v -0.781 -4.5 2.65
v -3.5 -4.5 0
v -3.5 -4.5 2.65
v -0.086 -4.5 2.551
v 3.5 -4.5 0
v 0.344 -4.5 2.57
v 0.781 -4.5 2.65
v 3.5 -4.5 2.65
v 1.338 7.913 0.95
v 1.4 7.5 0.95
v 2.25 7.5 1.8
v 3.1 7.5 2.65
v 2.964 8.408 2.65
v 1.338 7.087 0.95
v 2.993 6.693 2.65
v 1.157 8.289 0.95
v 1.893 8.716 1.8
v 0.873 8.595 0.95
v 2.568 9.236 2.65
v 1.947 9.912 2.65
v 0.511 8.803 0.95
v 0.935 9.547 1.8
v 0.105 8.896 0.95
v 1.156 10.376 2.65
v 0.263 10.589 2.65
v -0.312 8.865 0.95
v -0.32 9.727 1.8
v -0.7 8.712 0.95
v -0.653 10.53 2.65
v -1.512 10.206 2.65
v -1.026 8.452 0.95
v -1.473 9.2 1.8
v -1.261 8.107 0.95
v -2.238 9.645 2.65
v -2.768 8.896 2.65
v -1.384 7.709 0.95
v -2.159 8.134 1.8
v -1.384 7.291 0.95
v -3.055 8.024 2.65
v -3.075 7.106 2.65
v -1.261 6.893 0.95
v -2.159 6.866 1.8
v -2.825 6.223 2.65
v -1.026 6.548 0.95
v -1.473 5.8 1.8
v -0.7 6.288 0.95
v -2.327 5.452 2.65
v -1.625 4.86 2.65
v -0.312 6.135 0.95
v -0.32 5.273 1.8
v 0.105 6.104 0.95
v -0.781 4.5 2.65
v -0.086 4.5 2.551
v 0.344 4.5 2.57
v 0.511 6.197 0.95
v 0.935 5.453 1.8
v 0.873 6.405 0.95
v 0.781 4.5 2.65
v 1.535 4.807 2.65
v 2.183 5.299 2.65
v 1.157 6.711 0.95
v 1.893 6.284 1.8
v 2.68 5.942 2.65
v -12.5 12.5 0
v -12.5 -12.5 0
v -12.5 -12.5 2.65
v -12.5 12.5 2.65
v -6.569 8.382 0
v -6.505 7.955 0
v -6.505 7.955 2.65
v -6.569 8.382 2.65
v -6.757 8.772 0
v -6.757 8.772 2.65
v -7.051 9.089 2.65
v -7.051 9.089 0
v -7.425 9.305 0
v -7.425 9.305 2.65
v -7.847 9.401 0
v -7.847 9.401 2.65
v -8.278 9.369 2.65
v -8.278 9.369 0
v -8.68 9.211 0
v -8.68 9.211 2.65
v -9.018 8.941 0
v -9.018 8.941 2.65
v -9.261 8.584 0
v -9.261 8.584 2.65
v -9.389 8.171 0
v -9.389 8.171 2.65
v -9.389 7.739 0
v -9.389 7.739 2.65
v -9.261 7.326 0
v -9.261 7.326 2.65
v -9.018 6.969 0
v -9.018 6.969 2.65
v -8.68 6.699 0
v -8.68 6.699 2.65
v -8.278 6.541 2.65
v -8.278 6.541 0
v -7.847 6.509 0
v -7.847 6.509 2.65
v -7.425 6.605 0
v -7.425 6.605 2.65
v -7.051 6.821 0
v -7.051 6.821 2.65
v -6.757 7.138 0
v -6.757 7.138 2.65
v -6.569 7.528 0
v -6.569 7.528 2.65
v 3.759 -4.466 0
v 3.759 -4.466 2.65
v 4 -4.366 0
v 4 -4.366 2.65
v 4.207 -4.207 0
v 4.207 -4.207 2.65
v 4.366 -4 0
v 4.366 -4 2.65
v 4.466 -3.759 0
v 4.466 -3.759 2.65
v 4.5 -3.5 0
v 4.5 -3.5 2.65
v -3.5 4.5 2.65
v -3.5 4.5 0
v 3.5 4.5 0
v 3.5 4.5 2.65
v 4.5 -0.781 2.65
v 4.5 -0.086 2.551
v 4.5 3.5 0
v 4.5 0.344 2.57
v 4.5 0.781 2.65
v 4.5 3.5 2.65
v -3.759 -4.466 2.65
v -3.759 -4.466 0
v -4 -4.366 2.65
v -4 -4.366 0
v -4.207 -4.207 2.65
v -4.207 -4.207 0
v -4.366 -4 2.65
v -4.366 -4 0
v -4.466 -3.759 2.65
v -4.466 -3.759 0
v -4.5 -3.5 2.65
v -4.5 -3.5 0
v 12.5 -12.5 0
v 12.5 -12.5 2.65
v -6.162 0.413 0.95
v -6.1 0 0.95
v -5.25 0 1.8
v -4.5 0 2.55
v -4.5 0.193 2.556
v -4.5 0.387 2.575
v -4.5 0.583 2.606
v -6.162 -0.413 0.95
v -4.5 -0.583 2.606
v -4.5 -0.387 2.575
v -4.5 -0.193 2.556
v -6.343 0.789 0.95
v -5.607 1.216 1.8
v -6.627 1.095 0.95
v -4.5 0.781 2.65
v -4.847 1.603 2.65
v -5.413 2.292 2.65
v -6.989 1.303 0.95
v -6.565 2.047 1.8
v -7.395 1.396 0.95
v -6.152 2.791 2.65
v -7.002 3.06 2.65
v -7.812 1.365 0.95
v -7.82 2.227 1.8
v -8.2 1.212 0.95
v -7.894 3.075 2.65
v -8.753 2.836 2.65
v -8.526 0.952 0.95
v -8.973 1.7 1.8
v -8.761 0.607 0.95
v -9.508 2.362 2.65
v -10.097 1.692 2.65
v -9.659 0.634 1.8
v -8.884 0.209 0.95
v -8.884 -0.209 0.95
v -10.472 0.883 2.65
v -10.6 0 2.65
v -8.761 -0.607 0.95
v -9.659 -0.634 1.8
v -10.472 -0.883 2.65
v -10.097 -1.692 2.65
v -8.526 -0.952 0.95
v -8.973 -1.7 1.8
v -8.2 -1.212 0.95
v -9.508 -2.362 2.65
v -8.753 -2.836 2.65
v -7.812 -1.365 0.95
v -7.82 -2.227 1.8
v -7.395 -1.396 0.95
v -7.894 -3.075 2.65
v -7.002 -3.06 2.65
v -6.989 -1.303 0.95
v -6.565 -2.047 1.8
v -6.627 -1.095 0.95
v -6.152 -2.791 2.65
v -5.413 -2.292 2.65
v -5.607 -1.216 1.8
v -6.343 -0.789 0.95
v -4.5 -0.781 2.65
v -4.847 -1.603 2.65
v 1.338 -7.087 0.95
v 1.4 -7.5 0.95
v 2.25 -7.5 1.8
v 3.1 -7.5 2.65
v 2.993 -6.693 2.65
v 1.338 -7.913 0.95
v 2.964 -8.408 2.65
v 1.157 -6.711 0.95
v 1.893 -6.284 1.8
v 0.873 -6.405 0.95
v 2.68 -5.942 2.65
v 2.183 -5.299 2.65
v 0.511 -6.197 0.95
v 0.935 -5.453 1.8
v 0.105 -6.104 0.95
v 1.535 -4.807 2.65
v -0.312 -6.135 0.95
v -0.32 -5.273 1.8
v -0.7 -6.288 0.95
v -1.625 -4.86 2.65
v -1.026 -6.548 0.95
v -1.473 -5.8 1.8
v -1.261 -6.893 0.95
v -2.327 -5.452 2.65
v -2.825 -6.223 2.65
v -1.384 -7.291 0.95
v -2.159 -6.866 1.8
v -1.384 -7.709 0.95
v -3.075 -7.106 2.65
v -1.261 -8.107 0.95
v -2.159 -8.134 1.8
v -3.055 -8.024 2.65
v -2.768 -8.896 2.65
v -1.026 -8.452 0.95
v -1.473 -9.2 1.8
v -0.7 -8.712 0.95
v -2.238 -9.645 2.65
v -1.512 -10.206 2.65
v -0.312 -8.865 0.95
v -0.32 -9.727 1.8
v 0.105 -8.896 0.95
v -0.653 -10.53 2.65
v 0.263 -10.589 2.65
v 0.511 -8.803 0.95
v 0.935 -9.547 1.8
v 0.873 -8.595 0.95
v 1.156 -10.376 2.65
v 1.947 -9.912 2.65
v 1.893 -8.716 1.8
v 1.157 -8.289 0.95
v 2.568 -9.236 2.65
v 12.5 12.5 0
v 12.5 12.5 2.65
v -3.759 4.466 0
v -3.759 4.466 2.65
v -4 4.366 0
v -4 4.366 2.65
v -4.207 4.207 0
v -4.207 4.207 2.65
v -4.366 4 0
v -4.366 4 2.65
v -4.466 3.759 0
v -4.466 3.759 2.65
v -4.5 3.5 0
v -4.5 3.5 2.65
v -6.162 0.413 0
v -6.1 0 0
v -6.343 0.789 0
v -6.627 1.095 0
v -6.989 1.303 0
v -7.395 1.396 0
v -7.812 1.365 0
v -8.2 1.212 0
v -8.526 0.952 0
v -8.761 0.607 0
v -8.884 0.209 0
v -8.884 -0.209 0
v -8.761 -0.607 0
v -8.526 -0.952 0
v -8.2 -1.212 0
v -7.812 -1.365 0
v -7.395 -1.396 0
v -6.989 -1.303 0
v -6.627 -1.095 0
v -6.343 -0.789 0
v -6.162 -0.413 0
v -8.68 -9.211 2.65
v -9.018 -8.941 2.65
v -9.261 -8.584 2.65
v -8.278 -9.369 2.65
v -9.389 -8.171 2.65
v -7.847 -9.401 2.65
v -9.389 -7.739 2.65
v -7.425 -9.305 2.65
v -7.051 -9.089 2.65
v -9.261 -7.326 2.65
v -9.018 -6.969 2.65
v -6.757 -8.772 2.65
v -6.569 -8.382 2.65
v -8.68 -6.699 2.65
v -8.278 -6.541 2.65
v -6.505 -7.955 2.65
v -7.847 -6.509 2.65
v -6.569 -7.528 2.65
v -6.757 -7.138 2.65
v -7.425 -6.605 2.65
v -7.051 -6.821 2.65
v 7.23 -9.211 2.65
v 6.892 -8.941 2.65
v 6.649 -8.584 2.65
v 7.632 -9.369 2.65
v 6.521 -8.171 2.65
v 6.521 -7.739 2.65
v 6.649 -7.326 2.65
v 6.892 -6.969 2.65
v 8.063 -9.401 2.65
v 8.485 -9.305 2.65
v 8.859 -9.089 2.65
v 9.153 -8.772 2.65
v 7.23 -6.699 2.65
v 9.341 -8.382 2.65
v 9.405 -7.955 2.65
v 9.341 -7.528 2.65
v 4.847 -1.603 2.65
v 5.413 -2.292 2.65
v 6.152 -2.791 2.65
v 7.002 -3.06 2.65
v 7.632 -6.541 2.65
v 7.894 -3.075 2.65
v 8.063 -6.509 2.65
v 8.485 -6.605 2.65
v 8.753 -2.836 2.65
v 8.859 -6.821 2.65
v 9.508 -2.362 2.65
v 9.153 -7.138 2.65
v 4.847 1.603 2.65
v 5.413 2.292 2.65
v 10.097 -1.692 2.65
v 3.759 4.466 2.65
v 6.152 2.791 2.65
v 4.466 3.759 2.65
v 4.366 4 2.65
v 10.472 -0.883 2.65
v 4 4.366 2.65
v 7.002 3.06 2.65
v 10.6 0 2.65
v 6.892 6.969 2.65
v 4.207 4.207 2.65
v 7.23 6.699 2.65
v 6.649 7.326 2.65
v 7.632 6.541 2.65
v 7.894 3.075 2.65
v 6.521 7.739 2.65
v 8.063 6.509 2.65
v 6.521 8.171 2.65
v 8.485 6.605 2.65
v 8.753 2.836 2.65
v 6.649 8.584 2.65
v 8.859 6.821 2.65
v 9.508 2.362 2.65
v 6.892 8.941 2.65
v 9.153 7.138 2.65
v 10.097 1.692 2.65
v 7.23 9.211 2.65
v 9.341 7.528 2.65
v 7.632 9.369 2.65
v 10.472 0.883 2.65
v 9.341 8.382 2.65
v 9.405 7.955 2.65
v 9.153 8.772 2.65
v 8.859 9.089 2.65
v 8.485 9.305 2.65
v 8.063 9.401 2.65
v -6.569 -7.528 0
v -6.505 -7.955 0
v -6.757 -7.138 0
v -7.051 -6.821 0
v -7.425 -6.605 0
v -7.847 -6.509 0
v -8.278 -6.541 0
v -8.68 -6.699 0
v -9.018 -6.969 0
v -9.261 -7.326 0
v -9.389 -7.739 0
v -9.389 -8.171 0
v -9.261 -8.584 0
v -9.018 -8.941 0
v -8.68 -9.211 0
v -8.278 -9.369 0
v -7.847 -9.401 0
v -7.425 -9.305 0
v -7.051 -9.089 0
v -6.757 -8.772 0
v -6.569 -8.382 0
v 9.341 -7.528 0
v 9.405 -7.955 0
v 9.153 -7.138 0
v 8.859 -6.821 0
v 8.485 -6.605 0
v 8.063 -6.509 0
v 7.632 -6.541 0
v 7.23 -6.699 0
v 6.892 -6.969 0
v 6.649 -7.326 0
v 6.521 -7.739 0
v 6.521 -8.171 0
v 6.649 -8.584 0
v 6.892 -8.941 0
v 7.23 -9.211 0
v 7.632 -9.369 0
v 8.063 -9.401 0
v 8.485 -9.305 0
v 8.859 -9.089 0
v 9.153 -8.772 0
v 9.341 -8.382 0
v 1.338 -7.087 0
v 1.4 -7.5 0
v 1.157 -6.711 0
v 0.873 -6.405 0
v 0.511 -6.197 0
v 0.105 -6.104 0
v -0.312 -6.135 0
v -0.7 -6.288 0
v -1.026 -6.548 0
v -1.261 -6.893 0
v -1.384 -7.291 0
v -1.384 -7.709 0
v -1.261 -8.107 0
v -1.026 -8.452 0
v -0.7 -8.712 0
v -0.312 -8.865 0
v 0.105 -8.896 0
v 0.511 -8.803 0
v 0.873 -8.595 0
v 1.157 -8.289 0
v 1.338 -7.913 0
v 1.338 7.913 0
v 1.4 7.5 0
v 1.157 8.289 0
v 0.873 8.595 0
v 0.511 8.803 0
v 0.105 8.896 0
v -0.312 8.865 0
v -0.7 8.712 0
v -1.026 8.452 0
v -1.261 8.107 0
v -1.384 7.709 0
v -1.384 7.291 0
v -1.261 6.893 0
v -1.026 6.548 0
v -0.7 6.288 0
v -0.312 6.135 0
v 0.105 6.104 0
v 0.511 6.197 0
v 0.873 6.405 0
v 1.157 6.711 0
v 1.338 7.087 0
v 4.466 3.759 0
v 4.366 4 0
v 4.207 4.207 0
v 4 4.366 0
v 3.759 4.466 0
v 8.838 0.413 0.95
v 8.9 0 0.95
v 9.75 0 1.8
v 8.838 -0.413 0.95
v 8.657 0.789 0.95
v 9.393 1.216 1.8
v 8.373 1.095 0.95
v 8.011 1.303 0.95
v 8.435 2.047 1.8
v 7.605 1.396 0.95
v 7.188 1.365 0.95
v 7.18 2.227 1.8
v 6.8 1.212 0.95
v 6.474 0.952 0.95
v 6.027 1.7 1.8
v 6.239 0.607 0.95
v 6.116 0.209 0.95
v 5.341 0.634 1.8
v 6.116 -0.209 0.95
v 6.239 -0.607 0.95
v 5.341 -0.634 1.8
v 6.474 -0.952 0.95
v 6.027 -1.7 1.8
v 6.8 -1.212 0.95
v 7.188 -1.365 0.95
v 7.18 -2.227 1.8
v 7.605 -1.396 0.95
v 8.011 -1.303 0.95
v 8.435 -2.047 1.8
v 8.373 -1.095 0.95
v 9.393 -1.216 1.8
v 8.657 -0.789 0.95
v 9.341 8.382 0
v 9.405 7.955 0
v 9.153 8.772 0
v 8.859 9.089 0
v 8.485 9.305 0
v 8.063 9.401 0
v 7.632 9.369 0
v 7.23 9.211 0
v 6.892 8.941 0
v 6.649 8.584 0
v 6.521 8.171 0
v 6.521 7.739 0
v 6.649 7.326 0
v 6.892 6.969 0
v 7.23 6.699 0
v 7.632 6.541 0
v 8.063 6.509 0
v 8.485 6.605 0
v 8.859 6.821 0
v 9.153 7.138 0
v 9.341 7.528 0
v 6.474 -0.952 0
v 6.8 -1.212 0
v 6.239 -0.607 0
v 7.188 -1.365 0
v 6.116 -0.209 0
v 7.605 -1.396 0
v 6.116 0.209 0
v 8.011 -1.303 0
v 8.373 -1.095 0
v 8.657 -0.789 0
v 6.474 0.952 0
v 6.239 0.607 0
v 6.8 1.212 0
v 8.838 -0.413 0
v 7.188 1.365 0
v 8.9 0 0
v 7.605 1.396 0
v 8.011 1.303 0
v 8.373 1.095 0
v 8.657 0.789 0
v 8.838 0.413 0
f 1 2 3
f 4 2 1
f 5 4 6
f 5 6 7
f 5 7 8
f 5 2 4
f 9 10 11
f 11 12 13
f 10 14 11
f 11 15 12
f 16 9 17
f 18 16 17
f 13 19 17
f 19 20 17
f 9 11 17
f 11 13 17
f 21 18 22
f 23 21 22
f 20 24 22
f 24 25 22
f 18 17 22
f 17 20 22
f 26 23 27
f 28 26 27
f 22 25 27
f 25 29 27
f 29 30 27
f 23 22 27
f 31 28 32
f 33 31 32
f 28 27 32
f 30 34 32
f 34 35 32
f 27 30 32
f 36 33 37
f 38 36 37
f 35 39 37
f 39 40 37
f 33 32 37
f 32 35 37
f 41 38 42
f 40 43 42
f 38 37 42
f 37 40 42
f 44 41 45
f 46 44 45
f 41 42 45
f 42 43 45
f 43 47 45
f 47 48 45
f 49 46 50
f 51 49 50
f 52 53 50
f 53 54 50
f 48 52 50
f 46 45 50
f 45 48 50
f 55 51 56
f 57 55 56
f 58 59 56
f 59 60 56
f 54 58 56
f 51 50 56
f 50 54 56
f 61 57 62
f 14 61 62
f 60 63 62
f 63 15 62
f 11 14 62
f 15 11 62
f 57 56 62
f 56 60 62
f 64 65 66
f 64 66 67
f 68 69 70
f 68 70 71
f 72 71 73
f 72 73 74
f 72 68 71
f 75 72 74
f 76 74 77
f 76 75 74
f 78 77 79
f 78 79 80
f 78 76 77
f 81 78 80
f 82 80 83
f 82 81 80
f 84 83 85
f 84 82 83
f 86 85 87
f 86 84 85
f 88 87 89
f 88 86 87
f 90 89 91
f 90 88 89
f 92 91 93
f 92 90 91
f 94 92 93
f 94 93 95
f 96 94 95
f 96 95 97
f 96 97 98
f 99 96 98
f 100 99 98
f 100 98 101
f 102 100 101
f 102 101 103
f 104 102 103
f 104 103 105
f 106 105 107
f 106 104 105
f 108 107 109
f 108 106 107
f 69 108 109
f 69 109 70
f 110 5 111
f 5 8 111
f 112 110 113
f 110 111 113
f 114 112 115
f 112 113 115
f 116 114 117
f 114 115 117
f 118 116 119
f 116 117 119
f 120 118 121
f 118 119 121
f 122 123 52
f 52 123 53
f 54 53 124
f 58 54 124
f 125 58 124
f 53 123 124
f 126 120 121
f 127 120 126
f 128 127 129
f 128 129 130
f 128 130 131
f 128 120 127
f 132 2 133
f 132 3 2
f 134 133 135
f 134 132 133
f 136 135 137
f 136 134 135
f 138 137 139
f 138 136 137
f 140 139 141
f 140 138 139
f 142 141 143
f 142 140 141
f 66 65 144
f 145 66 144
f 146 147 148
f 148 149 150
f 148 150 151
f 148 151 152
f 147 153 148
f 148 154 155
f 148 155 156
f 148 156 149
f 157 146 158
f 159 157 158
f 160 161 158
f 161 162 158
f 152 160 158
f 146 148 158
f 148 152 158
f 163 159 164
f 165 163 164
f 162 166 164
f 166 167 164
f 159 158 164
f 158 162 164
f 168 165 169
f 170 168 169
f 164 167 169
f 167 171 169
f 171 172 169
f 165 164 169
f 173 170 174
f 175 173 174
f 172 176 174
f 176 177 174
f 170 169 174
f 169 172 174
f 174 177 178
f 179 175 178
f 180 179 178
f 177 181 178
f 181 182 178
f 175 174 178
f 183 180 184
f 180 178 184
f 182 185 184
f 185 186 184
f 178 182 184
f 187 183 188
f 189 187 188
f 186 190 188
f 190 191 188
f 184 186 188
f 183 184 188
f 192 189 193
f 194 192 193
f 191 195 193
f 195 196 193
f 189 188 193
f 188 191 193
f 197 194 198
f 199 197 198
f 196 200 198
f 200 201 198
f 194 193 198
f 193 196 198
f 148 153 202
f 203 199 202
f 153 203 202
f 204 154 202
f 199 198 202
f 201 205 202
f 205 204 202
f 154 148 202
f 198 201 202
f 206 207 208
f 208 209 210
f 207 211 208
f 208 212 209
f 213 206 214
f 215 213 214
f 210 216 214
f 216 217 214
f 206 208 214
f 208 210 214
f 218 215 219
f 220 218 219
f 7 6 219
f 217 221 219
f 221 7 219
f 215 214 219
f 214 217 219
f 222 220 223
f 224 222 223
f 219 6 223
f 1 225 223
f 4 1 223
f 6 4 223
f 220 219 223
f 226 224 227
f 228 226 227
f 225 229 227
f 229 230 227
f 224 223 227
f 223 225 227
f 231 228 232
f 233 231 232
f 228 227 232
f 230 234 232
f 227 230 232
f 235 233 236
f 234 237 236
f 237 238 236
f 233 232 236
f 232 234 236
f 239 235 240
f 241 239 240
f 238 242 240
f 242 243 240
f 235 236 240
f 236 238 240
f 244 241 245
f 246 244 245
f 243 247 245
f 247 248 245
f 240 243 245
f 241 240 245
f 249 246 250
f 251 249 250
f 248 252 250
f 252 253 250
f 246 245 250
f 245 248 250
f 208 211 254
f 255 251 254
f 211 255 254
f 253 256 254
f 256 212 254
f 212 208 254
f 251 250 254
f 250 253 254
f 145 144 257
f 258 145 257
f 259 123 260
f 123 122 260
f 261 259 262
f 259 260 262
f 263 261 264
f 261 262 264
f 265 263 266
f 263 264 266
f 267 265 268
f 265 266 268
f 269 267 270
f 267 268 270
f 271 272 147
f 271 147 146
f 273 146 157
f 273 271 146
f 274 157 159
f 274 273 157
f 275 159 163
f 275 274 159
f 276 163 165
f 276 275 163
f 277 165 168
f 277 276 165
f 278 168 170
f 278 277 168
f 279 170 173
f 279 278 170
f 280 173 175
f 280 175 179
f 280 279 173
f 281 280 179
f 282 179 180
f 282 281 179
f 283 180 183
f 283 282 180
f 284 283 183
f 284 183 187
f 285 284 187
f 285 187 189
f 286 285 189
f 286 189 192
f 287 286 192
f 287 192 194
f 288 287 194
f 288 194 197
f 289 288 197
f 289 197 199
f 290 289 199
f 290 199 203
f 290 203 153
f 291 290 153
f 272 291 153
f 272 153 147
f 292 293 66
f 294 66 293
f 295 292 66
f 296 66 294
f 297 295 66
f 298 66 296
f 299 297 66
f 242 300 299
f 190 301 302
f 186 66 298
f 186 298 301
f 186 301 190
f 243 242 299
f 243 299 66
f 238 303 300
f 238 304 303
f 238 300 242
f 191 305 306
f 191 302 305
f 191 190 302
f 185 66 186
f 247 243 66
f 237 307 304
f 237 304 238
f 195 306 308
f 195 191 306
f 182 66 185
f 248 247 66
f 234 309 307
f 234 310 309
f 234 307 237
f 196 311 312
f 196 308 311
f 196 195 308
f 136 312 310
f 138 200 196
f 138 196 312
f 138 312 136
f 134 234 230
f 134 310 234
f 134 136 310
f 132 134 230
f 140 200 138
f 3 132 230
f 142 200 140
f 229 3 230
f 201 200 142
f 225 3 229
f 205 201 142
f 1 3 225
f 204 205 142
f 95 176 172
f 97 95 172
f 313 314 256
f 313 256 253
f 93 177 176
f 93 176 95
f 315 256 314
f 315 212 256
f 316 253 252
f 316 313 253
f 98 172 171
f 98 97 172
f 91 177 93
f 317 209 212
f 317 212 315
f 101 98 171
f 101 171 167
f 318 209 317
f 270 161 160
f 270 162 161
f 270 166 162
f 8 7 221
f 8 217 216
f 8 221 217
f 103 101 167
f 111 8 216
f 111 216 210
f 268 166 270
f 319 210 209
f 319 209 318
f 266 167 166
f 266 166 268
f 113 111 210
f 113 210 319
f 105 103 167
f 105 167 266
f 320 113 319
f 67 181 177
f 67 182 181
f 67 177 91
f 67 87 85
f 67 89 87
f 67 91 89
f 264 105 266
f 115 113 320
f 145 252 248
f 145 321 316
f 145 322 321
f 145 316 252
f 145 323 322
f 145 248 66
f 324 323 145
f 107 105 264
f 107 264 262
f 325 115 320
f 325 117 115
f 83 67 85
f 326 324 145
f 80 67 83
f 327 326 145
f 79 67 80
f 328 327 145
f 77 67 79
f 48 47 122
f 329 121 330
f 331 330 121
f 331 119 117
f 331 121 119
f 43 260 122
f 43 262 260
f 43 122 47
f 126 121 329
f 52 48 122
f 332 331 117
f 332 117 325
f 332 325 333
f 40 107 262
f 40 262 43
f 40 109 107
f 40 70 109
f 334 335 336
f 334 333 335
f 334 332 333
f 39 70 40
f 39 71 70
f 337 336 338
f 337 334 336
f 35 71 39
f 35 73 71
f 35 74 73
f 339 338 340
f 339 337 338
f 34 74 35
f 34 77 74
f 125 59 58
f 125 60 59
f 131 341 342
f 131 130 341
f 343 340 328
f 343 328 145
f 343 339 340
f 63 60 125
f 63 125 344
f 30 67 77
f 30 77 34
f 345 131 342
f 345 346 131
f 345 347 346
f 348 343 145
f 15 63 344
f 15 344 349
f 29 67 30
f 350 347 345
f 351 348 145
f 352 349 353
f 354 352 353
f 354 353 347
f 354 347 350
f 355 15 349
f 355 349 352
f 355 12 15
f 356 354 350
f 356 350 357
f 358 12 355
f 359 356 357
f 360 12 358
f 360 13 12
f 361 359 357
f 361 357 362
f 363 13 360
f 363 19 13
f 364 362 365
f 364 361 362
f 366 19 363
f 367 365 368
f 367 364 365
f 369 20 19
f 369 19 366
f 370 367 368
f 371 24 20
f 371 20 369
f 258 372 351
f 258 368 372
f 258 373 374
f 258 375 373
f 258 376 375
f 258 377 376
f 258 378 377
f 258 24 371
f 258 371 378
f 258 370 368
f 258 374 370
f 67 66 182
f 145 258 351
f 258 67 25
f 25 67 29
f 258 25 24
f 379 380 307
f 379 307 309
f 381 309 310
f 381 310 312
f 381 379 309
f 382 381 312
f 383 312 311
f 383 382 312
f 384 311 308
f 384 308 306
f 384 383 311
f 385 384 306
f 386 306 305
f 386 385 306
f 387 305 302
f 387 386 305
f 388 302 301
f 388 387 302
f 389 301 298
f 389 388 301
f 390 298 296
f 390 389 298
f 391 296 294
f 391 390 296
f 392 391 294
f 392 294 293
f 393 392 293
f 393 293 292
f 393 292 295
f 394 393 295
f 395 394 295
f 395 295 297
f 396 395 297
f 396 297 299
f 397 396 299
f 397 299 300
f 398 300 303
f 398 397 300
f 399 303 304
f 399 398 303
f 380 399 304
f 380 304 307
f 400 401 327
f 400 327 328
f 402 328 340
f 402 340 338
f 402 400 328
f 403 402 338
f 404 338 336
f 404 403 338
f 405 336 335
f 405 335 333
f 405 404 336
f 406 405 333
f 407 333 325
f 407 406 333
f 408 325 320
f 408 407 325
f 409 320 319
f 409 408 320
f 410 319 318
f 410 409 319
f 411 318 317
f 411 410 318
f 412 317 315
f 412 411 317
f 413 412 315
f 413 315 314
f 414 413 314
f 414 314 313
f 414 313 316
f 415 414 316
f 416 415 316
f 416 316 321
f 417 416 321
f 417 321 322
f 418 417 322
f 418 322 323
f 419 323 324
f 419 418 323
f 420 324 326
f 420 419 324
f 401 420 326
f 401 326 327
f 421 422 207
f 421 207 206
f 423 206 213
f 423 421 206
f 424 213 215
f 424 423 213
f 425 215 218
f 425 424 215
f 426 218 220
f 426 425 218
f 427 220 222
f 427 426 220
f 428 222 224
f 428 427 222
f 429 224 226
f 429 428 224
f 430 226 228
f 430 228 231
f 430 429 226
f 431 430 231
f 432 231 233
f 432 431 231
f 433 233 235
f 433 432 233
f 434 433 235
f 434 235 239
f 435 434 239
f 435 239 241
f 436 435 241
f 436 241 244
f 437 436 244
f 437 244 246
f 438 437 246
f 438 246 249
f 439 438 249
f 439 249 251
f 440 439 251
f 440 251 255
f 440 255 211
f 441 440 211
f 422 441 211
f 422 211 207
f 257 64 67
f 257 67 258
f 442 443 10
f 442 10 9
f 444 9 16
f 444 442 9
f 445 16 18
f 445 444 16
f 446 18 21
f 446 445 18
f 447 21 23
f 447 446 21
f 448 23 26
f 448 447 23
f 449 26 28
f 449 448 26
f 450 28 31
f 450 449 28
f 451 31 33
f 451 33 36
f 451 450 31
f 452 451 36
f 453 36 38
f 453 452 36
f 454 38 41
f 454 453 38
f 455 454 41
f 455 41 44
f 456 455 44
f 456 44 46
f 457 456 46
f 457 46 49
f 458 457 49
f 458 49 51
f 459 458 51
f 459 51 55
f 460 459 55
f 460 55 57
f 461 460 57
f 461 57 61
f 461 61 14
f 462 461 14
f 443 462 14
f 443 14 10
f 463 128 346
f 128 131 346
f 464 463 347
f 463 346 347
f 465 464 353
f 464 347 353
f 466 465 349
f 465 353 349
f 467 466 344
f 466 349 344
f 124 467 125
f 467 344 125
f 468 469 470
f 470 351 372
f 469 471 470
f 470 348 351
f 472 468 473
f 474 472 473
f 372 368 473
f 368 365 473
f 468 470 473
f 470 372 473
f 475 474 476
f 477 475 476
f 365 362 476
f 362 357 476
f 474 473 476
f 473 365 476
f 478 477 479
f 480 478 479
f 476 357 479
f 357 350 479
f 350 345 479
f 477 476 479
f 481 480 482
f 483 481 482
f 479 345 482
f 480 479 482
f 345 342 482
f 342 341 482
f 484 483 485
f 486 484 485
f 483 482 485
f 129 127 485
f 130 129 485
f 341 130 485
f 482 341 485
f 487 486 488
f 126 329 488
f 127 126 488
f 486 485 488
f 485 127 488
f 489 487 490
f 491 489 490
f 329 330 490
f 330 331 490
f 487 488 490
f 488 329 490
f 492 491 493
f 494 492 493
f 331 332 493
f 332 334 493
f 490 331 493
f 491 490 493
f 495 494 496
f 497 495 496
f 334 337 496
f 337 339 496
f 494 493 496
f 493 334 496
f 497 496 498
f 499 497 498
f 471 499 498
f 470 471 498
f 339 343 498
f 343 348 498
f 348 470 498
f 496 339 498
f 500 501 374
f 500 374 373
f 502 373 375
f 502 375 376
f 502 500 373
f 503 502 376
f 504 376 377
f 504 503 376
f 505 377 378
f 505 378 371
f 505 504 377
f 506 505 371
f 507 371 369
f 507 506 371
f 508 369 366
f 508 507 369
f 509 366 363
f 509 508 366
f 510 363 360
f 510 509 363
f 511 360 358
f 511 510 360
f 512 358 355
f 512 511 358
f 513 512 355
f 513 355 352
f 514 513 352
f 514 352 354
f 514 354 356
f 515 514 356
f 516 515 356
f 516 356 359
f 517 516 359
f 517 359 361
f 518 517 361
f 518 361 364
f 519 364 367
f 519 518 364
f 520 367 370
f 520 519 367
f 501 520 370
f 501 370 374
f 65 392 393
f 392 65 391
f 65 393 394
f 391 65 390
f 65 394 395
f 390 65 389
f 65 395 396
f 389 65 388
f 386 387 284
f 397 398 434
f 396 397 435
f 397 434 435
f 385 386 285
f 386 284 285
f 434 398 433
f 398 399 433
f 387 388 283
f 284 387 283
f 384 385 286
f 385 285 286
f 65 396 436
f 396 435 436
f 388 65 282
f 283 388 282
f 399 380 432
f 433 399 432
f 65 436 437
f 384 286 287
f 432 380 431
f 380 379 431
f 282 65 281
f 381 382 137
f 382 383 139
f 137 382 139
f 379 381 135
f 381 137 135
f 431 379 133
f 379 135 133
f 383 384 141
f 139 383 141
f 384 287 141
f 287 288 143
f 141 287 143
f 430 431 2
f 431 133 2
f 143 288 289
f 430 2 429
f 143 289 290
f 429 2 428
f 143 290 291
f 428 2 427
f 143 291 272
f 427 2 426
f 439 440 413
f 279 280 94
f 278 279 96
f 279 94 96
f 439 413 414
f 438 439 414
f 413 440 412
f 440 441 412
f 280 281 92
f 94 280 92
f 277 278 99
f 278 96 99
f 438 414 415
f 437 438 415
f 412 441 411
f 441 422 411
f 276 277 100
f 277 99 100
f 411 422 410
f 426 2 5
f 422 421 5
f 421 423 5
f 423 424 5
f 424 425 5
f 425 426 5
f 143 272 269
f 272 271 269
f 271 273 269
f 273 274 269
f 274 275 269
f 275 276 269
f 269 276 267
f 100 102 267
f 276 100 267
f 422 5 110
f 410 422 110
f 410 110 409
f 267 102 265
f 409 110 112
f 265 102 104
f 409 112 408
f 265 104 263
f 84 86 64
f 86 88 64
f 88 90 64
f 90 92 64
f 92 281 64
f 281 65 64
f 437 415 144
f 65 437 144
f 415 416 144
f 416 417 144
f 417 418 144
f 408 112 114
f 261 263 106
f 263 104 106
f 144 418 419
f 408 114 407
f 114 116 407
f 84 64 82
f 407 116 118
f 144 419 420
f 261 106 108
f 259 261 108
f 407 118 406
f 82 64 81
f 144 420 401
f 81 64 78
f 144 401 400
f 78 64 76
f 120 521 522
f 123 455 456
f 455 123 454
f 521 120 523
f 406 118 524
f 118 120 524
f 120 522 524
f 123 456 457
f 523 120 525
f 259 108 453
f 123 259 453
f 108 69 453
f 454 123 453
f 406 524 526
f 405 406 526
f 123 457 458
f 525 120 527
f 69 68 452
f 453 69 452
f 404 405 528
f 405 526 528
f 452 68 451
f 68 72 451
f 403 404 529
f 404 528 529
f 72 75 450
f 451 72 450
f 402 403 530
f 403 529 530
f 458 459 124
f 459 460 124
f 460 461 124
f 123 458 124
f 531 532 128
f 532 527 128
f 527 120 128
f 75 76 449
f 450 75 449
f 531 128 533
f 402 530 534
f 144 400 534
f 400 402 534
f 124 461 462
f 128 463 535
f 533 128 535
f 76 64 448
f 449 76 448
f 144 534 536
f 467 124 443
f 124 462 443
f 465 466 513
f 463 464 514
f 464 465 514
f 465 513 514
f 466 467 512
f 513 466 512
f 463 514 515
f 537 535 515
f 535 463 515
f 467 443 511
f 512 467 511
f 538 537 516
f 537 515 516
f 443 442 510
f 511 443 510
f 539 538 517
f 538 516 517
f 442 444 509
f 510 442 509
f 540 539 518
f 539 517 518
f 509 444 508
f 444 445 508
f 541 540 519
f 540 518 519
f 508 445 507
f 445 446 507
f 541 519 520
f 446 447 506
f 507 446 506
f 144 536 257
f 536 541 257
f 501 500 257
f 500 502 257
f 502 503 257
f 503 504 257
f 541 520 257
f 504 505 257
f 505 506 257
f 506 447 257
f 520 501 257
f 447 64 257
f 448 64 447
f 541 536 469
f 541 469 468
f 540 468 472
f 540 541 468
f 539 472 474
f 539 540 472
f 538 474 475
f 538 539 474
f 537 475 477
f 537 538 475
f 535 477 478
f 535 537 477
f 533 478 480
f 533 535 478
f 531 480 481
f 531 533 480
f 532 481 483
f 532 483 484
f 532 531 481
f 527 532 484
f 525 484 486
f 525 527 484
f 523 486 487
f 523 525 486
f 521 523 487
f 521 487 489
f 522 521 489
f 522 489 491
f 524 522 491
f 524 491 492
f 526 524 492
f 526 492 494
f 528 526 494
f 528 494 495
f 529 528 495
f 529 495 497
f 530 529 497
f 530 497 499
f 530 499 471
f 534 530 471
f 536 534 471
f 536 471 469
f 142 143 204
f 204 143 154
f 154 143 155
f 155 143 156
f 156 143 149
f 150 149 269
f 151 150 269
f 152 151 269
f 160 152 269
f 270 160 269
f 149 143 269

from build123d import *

# Parameters (mm, degrees)
SKETCH_1_W      = 25
SKETCH_1_H      = 25
SKETCH_1_R      = 1.4
SKETCH_1_R_2    = 1.45
SKETCH_1_W_2    = 9
SKETCH_1_H_2    = 9
EXTRUDE_1_DEPTH = 2.65
CHAMFER_1_SIZE  = 1.7
FILLET_1_R      = 1


with BuildPart() as part:
    # 草图1 → 凸台-拉伸1 (new body)
    with BuildSketch(Plane.XY):
        Rectangle(SKETCH_1_W, SKETCH_1_H)
        with Locations((0, 7.5)):
            Circle(SKETCH_1_R, mode=Mode.SUBTRACT)
        with Locations((7.5, 0)):
            Circle(SKETCH_1_R, mode=Mode.SUBTRACT)
        with Locations((0, -7.5)):
            Circle(SKETCH_1_R, mode=Mode.SUBTRACT)
        with Locations((-7.5, 0)):
            Circle(SKETCH_1_R, mode=Mode.SUBTRACT)
        with Locations((7.954951288, 7.954951288)):
            Circle(SKETCH_1_R_2, mode=Mode.SUBTRACT)
        with Locations((7.954951288, -7.954951288)):
            Circle(SKETCH_1_R_2, mode=Mode.SUBTRACT)
        with Locations((-7.954951288, -7.954951288)):
            Circle(SKETCH_1_R_2, mode=Mode.SUBTRACT)
        with Locations((-7.954951288, 7.954951288)):
            Circle(SKETCH_1_R_2, mode=Mode.SUBTRACT)
        Rectangle(SKETCH_1_W_2, SKETCH_1_H_2, mode=Mode.SUBTRACT)
    extrude(amount=EXTRUDE_1_DEPTH)

    # 倒角1
    # the kernel refuses this chamfer: 1.7 mm, written as the material it takes off along each edge
    with BuildSketch(Plane(origin=(0, 7.5, 2.65), x_dir=(1, 0, 0), z_dir=(0, -1, 0))) as chamfer_1_piece_1:
        Polygon((1.4, -CHAMFER_1_SIZE), (1.4 + CHAMFER_1_SIZE, 0), (1.4, 0), align=None)
    revolve(axis=Axis((0, 7.5, 2.65), (0, 0, 1)), mode=Mode.SUBTRACT)
    with BuildSketch(Plane(origin=(7.5, 0, 2.65), x_dir=(1, 0, 0), z_dir=(0, -1, 0))) as chamfer_1_piece_2:
        Polygon((1.4, -CHAMFER_1_SIZE), (1.4 + CHAMFER_1_SIZE, 0), (1.4, 0), align=None)
    revolve(axis=Axis((7.5, 0, 2.65), (0, 0, 1)), mode=Mode.SUBTRACT)
    with BuildSketch(Plane(origin=(0, -7.5, 2.65), x_dir=(1, 0, 0), z_dir=(0, -1, 0))) as chamfer_1_piece_3:
        Polygon((1.4, -CHAMFER_1_SIZE), (1.4 + CHAMFER_1_SIZE, 0), (1.4, 0), align=None)
    revolve(axis=Axis((0, -7.5, 2.65), (0, 0, 1)), mode=Mode.SUBTRACT)
    with BuildSketch(Plane(origin=(-7.5, 0, 2.65), x_dir=(1, 0, 0), z_dir=(0, -1, 0))) as chamfer_1_piece_4:
        Polygon((1.4, -CHAMFER_1_SIZE), (1.4 + CHAMFER_1_SIZE, 0), (1.4, 0), align=None)
    revolve(axis=Axis((-7.5, 0, 2.65), (0, 0, 1)), mode=Mode.SUBTRACT)

    # 圆角1
    fillet_1_edges = [part.edges().sort_by_distance(p)[0] for p in [
        (4.5, -4.5, 1.325),
        (4.5, 4.5, 1.325),
        (-4.5, 4.5, 1.325),
        (-4.5, -4.5, 1.325),
    ]]
    fillet(fillet_1_edges, radius=FILLET_1_R)


solid = part.part
